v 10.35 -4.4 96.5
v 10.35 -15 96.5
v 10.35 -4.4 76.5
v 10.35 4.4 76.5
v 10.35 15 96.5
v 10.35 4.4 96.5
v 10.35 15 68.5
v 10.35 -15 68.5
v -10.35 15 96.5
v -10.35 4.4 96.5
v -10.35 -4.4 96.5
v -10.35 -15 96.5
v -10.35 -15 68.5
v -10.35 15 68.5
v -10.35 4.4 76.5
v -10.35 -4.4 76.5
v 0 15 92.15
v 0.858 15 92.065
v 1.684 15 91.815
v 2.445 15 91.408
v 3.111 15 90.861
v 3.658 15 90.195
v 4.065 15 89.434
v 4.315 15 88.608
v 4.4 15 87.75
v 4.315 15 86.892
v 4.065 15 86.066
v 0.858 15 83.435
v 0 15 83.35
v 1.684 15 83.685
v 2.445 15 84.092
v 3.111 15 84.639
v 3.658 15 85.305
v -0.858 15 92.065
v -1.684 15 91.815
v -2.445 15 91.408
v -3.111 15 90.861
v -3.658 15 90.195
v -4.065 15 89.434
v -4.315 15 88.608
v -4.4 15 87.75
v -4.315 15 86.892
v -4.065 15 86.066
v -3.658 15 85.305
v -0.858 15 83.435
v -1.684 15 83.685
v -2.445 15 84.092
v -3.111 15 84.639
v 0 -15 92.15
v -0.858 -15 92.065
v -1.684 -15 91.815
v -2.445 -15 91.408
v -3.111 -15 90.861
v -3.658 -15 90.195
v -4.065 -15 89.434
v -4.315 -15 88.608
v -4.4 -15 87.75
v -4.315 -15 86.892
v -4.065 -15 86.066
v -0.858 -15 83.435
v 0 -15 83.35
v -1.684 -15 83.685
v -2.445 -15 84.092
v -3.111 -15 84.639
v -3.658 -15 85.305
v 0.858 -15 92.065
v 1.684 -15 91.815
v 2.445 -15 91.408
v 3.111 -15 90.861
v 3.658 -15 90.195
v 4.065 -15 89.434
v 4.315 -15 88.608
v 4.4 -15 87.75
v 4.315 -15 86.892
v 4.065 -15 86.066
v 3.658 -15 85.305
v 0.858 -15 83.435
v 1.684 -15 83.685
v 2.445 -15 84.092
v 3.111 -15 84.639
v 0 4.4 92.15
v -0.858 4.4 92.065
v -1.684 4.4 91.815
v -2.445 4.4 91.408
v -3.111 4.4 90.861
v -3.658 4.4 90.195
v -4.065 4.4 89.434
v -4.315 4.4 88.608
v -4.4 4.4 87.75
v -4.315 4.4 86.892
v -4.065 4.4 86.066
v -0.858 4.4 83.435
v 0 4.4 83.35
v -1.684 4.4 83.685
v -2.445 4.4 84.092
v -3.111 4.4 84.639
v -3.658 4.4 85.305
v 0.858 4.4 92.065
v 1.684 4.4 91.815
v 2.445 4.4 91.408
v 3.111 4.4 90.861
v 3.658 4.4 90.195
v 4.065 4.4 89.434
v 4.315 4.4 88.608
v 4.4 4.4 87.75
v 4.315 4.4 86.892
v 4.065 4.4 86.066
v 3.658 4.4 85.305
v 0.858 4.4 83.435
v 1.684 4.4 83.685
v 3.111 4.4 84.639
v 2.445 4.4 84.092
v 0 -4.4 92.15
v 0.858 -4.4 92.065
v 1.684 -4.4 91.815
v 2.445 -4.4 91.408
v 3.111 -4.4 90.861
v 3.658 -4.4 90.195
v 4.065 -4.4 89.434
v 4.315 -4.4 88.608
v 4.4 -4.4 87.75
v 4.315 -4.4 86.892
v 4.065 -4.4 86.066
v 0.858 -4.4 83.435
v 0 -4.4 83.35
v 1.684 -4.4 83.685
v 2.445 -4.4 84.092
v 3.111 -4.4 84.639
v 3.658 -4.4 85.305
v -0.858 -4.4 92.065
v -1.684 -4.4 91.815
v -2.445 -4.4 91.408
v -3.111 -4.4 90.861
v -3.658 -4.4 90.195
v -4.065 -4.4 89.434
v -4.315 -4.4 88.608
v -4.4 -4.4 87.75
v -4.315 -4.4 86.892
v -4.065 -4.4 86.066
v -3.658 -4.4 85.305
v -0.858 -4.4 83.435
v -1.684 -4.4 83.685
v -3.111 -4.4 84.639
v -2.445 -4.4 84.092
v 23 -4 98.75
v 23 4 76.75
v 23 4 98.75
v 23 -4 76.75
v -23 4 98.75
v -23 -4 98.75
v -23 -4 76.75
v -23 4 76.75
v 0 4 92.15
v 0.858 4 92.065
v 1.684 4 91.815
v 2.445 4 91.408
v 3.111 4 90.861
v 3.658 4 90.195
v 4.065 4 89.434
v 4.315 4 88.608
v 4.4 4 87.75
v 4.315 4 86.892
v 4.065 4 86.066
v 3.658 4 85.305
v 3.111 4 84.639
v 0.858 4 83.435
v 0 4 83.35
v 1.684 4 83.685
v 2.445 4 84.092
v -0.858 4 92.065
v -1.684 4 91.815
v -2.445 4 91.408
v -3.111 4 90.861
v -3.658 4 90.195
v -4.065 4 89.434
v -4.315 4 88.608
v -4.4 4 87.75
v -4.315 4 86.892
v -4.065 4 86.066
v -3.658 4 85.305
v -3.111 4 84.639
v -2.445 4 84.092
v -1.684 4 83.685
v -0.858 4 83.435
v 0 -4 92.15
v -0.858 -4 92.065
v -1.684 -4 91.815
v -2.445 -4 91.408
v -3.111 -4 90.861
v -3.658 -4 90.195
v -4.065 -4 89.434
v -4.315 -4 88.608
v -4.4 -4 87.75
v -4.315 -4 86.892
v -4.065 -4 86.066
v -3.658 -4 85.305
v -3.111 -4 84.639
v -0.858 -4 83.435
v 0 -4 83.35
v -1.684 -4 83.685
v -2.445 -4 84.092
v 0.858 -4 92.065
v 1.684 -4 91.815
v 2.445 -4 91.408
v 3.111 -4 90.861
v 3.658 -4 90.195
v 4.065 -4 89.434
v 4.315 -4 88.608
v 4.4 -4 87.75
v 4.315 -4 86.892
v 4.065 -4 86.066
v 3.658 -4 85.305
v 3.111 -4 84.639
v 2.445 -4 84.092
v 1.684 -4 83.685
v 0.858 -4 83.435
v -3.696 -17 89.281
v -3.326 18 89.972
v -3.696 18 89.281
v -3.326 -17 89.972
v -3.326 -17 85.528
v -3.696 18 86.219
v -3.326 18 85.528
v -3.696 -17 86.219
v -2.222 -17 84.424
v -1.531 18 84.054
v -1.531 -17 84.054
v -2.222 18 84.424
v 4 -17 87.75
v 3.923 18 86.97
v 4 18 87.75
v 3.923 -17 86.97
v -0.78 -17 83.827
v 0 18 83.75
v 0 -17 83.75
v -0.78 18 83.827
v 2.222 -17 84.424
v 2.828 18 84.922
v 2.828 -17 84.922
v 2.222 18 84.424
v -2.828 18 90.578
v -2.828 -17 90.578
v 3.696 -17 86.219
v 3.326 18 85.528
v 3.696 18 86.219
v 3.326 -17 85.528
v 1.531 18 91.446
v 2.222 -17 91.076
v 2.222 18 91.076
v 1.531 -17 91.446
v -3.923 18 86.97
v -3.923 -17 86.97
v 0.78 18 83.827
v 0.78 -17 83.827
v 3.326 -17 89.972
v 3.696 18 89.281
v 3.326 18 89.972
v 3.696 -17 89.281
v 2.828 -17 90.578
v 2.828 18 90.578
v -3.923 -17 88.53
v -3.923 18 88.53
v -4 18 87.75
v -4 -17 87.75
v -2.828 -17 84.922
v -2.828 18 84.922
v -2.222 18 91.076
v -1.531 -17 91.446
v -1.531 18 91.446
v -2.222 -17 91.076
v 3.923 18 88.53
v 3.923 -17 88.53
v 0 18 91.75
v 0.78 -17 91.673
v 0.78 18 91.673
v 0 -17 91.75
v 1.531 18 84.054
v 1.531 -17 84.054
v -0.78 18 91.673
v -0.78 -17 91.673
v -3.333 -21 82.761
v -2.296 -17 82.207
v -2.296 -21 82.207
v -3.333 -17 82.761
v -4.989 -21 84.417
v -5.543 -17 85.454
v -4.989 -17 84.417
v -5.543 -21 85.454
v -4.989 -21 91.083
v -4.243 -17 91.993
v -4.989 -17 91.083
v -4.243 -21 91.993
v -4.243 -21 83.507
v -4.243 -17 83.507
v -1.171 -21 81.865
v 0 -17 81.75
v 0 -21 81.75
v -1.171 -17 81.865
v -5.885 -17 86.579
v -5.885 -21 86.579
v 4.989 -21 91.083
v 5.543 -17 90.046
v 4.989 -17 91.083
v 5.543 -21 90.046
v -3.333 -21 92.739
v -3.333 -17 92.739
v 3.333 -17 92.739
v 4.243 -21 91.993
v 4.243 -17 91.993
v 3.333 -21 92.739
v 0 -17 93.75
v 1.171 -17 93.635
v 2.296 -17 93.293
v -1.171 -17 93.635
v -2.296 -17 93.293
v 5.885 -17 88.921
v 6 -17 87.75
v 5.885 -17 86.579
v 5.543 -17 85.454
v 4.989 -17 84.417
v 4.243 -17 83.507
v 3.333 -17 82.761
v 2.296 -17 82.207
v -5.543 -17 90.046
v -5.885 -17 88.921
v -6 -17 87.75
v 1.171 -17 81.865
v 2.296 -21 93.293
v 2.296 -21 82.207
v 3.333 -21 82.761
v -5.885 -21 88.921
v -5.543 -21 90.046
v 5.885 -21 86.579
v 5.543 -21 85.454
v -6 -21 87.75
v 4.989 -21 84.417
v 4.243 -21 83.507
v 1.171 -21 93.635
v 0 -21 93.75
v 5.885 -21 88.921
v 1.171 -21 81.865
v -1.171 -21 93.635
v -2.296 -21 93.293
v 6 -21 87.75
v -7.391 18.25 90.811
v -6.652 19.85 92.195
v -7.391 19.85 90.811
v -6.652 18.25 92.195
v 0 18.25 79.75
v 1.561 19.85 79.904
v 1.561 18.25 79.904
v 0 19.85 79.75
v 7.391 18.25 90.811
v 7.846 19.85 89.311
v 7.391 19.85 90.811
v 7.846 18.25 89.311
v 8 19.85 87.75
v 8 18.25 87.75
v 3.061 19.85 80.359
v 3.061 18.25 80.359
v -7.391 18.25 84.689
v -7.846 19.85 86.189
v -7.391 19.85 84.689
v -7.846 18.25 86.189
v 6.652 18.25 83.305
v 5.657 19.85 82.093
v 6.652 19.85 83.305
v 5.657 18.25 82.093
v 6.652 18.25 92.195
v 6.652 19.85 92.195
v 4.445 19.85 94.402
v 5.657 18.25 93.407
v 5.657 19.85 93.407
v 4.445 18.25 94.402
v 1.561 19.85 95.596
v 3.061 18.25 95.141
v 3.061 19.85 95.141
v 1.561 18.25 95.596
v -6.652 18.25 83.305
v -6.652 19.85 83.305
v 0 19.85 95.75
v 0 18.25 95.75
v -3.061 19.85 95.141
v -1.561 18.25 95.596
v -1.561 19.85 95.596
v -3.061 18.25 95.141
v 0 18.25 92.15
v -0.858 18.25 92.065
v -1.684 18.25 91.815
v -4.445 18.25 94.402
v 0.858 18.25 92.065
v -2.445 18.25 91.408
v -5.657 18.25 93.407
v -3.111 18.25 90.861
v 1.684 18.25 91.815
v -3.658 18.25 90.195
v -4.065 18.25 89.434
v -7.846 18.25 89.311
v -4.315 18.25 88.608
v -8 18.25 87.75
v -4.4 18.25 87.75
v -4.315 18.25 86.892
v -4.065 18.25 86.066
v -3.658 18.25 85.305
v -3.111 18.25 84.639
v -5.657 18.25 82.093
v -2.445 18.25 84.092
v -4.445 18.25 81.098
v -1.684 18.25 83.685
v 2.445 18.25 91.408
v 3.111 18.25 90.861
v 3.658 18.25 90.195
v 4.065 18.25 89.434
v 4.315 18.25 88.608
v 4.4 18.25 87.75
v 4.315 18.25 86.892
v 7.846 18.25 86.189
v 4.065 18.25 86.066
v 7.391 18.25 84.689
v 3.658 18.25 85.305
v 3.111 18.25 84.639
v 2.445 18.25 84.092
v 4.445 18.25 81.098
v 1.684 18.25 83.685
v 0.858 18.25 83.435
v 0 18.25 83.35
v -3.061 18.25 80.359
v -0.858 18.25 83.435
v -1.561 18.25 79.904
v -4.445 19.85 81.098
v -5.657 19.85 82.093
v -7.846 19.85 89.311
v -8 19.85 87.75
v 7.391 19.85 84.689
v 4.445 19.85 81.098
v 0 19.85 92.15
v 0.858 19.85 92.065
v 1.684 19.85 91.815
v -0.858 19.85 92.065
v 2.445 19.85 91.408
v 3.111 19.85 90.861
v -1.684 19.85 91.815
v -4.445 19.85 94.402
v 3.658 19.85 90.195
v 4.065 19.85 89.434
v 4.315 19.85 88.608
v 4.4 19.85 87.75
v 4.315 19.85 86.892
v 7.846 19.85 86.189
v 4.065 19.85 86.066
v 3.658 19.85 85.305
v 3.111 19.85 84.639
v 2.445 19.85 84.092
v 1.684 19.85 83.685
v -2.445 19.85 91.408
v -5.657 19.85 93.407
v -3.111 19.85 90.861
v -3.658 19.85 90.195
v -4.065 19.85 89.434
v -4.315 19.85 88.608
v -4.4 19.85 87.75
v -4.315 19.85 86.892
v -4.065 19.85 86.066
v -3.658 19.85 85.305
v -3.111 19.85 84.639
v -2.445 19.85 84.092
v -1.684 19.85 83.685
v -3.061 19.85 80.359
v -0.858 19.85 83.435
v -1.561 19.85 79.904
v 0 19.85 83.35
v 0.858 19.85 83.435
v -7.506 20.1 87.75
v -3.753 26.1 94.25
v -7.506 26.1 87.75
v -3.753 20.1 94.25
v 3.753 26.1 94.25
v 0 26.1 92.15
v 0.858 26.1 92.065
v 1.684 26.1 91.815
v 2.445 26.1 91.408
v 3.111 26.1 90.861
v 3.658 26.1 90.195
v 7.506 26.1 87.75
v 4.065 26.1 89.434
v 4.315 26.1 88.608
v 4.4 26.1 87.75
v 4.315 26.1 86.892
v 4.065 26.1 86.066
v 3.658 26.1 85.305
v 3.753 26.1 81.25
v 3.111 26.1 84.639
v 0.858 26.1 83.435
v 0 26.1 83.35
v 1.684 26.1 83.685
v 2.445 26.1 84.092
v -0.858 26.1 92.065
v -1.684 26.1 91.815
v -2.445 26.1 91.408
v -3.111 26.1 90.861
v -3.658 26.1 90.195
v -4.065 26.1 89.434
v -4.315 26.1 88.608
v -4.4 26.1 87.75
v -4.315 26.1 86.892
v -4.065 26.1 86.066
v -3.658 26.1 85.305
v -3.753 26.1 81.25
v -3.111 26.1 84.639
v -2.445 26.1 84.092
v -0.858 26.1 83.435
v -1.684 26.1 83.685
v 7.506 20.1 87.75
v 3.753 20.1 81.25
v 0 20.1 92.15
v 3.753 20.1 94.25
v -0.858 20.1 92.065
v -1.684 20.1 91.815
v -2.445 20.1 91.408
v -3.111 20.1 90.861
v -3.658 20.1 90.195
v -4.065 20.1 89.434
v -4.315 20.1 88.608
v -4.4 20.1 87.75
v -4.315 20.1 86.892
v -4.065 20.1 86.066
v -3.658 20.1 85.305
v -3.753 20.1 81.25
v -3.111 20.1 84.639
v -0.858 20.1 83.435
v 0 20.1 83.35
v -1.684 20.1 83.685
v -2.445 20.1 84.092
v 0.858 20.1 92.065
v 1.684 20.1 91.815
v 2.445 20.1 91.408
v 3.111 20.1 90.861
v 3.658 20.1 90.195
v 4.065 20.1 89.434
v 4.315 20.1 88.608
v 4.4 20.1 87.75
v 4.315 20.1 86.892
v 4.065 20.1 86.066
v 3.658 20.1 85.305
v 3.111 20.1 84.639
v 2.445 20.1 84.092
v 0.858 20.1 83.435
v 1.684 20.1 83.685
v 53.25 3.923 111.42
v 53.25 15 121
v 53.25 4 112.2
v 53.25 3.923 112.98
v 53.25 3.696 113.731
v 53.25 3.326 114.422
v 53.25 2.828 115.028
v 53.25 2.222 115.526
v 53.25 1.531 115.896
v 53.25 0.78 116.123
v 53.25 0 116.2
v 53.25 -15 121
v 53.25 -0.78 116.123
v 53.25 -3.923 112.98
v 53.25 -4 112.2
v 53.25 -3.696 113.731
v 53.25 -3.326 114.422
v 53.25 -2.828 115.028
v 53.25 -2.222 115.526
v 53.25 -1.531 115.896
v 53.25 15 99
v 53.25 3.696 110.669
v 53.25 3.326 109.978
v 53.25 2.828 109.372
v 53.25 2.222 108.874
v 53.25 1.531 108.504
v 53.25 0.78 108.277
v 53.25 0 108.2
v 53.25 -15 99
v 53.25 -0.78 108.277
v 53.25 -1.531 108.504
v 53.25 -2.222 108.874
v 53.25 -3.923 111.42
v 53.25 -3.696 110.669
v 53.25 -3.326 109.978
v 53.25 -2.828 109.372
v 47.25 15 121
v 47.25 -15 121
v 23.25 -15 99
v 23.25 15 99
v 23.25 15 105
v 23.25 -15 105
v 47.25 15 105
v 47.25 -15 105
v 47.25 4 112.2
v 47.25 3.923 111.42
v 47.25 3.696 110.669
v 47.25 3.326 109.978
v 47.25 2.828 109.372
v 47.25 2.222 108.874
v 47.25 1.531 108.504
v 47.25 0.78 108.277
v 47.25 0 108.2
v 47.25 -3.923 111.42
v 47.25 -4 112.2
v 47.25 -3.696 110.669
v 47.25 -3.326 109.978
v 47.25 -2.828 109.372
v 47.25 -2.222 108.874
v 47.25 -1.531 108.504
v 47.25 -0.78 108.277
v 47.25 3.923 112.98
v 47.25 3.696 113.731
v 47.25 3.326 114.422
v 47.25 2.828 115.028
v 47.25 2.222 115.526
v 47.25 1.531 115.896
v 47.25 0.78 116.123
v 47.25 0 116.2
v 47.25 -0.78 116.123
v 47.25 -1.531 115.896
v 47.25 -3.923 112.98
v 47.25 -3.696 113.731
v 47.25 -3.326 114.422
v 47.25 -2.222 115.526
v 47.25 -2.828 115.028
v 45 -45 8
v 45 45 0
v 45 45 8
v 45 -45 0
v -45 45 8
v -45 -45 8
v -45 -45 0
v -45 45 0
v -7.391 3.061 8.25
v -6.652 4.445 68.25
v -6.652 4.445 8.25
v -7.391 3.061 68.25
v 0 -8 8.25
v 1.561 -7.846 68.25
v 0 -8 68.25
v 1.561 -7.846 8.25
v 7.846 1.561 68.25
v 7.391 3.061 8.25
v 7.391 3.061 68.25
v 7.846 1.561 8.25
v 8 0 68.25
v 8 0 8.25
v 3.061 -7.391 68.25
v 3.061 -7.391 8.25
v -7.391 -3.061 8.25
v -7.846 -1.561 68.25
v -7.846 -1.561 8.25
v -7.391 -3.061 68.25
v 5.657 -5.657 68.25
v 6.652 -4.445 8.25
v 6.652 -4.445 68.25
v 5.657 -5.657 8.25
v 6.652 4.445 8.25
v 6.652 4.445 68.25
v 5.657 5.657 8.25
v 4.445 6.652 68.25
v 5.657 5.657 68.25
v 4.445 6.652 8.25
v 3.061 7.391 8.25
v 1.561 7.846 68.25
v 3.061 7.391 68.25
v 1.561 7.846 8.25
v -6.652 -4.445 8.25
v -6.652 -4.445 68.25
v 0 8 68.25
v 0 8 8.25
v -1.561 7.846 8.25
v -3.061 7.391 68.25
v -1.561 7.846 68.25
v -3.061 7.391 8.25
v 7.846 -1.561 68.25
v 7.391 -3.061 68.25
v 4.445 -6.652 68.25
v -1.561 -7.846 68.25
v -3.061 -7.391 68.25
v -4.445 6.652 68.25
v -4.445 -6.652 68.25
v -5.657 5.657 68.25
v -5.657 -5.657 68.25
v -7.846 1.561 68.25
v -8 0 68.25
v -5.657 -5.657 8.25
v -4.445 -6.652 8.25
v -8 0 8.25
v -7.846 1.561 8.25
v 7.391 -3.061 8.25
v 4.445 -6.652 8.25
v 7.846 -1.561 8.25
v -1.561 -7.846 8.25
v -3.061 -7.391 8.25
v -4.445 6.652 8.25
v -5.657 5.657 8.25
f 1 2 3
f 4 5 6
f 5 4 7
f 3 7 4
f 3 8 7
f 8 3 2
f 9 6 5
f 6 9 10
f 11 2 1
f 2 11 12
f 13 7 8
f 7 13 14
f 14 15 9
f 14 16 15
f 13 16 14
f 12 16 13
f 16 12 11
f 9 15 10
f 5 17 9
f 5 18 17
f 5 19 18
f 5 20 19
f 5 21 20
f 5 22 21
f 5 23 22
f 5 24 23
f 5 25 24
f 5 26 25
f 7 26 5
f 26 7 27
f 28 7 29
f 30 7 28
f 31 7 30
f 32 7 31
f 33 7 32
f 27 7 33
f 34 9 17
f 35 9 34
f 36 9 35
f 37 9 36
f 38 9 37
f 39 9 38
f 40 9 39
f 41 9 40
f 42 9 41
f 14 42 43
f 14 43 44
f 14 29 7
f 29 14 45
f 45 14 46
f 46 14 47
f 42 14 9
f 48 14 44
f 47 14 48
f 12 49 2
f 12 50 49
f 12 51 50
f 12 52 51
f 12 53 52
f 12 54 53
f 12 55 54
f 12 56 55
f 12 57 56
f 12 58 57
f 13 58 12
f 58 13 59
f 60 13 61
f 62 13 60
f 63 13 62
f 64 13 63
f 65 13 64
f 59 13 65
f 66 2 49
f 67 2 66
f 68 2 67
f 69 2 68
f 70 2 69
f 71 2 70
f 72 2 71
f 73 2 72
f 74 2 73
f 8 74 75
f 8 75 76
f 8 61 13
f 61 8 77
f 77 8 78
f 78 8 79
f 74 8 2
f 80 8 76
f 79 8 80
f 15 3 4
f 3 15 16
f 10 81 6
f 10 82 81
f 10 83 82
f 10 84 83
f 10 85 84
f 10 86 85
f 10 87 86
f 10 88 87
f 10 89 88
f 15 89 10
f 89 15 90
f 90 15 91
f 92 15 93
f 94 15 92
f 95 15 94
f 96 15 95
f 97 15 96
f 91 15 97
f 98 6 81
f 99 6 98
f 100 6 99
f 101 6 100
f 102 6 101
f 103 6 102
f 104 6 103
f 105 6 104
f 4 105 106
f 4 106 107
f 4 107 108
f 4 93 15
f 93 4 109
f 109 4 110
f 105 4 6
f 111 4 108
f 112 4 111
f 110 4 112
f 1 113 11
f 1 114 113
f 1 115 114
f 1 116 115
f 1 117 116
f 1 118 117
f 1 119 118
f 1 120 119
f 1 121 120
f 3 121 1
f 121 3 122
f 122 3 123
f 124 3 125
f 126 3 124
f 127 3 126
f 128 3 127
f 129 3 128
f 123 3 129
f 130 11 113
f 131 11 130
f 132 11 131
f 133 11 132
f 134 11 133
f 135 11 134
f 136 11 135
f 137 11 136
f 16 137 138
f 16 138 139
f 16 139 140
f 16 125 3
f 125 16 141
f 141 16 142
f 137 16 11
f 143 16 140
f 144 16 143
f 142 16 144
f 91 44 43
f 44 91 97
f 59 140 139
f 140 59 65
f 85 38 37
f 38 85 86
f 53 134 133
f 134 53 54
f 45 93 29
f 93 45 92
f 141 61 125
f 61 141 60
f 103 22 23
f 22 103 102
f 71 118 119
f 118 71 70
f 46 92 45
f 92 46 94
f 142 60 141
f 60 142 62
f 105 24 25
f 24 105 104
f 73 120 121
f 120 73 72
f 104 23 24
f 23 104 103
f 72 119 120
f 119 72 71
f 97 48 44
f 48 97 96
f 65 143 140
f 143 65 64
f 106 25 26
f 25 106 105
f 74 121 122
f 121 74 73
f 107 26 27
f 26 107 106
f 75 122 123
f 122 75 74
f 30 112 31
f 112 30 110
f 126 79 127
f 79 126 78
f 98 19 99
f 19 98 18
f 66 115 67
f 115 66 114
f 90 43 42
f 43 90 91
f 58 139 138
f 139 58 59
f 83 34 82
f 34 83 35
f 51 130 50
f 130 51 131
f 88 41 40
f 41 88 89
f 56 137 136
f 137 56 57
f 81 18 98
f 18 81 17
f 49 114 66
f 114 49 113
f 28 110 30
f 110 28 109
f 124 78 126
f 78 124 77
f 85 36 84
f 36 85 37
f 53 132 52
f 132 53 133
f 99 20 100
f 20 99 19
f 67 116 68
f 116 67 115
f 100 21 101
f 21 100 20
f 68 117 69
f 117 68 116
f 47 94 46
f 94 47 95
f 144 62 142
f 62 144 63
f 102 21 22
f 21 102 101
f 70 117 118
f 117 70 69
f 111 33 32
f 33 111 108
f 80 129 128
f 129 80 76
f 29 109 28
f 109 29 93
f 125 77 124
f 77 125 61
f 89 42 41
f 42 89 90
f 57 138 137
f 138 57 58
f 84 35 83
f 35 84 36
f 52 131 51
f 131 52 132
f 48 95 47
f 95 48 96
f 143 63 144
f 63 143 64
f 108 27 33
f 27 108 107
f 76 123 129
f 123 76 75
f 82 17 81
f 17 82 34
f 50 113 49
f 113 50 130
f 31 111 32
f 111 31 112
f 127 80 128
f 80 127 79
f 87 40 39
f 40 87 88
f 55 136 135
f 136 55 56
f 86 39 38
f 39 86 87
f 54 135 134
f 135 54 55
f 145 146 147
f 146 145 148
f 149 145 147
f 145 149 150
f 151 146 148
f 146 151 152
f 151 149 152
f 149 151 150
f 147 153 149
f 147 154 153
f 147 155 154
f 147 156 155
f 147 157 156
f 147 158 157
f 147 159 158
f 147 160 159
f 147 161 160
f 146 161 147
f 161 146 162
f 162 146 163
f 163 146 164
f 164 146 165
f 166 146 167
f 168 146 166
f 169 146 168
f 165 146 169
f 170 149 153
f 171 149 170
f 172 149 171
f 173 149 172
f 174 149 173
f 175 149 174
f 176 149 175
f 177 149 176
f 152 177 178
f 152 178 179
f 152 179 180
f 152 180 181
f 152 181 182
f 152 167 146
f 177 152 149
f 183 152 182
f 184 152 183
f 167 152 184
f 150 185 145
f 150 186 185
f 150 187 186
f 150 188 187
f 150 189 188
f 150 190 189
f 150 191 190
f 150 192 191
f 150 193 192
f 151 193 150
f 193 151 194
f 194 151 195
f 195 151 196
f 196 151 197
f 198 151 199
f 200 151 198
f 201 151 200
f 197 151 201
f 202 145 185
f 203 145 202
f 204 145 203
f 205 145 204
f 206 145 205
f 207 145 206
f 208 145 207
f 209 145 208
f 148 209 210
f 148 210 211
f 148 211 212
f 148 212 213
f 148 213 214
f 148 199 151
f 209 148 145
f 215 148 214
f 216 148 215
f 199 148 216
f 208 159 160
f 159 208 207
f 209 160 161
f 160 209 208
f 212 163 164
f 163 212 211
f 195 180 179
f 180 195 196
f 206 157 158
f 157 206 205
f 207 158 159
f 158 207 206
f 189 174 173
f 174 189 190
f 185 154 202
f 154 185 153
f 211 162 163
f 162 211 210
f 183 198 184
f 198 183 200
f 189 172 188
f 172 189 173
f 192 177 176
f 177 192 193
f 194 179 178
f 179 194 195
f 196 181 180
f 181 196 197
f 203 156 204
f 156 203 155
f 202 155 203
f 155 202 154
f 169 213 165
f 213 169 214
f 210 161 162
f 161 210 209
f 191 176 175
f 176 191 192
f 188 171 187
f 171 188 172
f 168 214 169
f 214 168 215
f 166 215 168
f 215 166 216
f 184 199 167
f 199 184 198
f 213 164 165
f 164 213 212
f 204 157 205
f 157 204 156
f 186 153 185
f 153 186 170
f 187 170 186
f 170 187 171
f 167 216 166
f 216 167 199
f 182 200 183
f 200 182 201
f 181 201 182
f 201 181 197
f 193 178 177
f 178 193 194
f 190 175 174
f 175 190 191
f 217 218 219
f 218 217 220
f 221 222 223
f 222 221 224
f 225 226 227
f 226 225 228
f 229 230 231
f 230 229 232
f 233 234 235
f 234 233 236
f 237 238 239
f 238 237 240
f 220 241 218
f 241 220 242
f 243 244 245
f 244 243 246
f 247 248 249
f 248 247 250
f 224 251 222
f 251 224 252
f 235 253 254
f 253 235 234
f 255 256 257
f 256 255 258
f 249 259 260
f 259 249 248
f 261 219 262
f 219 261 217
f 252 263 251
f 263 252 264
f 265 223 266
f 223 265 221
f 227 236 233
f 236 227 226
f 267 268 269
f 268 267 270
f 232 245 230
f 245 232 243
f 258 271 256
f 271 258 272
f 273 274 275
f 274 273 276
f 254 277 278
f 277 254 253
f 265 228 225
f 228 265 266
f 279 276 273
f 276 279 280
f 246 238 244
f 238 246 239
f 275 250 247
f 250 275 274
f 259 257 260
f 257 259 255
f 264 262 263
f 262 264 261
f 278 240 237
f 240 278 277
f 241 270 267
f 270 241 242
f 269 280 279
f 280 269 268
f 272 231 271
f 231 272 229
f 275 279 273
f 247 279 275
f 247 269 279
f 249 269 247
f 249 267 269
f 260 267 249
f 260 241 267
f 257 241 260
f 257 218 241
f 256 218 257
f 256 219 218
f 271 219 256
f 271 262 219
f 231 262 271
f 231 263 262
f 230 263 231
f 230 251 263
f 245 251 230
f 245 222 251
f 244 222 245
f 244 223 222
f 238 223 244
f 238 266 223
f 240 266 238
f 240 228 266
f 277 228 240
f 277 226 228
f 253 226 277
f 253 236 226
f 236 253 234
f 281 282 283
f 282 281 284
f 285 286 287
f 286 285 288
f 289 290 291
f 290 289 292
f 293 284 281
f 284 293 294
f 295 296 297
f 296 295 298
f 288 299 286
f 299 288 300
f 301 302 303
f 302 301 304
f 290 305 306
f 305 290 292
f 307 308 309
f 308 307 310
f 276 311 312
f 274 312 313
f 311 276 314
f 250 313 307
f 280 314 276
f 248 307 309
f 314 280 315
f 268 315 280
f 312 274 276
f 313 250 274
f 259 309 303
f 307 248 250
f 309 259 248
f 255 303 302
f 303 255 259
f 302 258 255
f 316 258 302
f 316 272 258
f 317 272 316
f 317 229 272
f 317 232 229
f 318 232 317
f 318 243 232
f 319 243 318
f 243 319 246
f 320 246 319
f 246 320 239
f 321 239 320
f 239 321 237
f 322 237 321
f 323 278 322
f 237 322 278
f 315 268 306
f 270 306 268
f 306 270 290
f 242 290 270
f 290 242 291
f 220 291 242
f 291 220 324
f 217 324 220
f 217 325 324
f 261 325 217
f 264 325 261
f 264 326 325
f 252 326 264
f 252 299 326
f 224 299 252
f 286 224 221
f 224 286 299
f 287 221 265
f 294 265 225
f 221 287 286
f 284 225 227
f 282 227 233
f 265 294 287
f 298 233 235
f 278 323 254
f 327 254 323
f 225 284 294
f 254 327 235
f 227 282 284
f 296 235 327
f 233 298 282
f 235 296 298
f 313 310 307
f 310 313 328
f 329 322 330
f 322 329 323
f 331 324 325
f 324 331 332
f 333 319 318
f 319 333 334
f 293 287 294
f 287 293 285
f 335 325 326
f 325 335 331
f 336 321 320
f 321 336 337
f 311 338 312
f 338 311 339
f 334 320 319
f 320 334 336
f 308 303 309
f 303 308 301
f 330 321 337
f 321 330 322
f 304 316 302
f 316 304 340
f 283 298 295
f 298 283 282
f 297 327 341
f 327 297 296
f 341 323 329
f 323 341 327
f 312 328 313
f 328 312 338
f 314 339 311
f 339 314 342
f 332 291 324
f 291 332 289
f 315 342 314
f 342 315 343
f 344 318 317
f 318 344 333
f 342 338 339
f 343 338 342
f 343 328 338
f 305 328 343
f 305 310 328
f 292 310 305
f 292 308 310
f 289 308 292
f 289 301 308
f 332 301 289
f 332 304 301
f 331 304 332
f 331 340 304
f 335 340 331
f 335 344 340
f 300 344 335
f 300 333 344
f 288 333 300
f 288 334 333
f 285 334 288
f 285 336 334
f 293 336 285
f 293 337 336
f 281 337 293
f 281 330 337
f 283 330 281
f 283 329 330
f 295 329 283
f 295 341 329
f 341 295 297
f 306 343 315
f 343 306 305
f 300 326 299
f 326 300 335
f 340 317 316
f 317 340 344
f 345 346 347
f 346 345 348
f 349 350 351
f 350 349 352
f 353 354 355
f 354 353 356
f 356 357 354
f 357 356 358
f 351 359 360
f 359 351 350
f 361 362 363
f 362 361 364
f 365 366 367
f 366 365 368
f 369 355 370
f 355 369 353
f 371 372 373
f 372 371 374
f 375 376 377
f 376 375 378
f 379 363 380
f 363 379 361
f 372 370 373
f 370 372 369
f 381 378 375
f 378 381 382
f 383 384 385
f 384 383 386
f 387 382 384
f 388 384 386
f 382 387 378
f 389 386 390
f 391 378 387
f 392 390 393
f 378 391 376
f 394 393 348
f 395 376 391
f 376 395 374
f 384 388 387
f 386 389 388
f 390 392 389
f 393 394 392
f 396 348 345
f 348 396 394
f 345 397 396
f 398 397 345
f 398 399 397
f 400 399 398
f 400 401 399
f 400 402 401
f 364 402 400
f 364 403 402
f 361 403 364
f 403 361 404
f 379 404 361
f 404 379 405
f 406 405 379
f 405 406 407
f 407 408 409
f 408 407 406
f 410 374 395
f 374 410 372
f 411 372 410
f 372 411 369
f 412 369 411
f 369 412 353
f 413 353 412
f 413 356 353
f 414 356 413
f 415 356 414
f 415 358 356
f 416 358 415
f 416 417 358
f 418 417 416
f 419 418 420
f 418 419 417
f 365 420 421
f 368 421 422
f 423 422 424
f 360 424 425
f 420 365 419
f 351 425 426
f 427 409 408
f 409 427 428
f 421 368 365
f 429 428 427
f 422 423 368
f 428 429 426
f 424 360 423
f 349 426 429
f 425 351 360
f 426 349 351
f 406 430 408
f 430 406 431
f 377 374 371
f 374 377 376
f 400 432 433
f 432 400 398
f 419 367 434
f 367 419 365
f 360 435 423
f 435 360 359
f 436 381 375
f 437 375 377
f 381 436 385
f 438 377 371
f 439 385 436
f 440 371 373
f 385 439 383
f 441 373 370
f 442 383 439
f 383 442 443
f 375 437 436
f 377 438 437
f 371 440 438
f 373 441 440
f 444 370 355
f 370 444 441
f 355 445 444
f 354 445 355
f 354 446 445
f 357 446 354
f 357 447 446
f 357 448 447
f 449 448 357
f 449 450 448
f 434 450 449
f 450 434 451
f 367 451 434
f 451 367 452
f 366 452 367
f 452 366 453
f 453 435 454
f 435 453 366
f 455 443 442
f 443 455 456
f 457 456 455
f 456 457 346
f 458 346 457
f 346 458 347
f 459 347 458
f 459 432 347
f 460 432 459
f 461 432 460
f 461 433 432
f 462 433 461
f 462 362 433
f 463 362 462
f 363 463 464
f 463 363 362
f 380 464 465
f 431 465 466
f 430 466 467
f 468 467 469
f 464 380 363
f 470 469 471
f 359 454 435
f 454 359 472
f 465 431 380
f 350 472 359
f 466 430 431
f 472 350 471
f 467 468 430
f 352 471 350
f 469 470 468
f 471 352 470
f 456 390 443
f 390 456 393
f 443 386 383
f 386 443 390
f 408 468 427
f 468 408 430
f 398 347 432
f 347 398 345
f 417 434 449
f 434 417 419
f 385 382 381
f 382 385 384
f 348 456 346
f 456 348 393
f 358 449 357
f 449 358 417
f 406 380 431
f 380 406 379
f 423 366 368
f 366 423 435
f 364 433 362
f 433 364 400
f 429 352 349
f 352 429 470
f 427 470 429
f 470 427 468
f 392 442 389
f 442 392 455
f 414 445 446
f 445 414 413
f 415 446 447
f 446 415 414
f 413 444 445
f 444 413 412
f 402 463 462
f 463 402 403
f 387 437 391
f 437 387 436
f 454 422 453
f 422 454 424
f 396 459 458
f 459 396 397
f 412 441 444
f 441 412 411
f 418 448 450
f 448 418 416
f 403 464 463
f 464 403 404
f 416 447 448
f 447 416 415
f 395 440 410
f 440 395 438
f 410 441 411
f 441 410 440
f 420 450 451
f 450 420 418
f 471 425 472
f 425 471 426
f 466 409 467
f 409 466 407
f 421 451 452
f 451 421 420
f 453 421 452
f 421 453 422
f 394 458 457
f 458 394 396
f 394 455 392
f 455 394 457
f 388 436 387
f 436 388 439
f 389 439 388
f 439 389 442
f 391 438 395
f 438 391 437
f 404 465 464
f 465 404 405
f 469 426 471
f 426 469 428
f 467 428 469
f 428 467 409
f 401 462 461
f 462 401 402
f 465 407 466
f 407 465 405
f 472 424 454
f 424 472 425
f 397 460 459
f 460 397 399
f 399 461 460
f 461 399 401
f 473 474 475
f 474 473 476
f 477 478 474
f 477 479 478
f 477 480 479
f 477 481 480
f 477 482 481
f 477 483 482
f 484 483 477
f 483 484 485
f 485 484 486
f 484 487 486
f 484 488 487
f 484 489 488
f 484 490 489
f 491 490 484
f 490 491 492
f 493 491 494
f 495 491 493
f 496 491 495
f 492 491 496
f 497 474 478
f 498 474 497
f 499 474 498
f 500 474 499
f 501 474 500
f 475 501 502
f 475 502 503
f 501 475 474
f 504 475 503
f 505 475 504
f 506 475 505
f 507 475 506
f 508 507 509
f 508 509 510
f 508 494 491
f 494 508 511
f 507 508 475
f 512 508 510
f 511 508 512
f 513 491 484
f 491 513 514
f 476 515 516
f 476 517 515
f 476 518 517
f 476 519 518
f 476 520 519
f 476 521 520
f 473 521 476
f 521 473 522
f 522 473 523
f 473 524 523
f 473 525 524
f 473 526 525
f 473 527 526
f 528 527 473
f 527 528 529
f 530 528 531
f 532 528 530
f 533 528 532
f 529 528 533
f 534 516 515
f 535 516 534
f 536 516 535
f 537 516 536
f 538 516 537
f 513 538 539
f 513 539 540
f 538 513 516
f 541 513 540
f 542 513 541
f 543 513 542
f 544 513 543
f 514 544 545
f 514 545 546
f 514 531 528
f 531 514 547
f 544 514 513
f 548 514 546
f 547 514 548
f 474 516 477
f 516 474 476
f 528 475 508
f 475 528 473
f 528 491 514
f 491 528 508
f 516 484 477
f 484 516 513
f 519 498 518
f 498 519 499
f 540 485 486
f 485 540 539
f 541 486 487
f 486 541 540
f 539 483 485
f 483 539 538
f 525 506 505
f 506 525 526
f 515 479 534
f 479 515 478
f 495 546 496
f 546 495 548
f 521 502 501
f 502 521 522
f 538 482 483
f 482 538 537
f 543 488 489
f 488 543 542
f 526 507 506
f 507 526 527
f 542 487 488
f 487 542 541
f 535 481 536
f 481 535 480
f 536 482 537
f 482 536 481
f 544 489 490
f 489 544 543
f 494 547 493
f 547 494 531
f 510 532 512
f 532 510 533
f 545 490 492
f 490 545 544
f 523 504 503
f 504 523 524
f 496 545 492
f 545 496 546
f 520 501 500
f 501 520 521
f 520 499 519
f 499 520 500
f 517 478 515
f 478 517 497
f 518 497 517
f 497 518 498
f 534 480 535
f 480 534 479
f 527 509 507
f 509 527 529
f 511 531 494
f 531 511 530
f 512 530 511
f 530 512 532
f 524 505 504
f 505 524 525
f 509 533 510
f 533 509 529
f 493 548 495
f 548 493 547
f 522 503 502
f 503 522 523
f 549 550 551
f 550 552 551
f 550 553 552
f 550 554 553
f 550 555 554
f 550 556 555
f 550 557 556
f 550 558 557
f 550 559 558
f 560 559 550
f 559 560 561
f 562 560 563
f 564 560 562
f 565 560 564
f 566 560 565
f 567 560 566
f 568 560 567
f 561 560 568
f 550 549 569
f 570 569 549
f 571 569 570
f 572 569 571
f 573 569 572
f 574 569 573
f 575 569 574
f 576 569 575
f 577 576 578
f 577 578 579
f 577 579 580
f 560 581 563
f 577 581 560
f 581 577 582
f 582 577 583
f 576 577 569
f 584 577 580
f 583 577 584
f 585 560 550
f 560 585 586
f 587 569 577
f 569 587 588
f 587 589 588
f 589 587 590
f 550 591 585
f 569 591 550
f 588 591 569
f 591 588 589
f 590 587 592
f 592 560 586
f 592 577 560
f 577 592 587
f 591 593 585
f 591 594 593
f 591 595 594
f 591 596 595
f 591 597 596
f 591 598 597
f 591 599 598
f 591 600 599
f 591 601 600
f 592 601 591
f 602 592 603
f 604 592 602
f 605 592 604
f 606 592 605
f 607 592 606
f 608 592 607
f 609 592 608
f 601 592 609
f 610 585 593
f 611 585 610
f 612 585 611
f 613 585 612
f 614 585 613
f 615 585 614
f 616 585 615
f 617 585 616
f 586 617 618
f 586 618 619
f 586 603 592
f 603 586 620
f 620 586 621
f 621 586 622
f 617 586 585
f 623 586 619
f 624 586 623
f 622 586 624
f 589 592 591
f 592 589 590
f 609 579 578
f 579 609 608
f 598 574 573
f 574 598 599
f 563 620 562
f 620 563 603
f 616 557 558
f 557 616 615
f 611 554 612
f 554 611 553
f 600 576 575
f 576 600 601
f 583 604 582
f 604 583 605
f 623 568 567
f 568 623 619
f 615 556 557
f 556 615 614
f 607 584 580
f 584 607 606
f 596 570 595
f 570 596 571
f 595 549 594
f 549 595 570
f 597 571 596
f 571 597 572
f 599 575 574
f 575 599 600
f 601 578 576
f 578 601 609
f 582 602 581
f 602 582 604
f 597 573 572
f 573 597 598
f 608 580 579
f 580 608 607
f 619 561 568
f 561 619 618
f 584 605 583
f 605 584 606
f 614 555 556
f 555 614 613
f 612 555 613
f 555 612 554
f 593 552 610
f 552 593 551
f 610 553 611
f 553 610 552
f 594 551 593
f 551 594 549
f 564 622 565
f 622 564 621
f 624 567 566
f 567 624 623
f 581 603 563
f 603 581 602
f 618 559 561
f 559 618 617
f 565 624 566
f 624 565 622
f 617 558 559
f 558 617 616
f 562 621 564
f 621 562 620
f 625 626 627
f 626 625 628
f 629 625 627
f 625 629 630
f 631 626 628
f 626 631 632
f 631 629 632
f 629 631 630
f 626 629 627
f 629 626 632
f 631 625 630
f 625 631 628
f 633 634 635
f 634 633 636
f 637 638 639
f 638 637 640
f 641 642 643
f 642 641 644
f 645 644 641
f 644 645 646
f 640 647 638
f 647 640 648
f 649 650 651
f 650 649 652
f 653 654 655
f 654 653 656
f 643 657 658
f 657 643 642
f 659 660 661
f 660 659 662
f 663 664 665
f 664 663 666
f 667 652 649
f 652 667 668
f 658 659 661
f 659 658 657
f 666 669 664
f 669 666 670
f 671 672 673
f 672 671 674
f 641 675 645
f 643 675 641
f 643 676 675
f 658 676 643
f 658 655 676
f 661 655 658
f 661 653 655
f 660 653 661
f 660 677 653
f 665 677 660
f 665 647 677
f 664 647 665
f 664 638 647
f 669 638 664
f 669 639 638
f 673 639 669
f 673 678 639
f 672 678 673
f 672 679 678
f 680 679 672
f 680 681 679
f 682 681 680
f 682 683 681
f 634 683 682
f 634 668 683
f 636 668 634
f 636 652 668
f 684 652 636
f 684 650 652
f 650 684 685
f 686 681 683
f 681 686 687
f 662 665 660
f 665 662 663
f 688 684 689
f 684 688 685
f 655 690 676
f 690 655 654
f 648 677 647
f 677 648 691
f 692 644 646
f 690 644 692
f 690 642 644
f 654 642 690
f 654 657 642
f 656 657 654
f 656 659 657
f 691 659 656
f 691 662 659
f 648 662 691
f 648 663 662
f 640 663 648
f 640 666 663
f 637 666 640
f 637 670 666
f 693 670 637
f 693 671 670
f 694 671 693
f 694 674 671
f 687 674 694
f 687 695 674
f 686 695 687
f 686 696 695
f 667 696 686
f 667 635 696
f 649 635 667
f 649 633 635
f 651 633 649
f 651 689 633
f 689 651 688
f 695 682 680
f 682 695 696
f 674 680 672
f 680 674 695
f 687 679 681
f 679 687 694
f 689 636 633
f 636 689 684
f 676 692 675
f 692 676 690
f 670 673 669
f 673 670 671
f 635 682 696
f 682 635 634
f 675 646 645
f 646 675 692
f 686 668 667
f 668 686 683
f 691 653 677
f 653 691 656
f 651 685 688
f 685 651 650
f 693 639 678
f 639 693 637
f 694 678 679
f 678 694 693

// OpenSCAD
$fn = 32;

// ------------------------------------------------------------------------
// Lamp arm: column d16 x 60 mm, arm 46 mm
// Every part is its own module, assembly() places every instance.
// ------------------------------------------------------------------------

// --- part 1 ---
module lamp_base() {
  difference() {
    translate([-45, -45, 0]) cube([90, 90, 8]);
  }
}

// --- part 2 ---
module lamp_column() {
  cylinder(h = 60, d = 16);
}

// --- part 3 ---
module head_fork() {
  difference() {
    translate([-10.35, -15, 0]) cube([20.7, 30, 28]);
    translate([-11.35, -4.4, 8]) cube([22.7, 8.8, 21]);
    translate([0, 0, 19.25]) rotate([90, 0, 0]) cylinder(h = 32, d = 8.8, center = true);
  }
}

// --- part 4 ---
module lamp_arm() {
  difference() {
    translate([-23, -4, 0]) cube([46, 8, 22]);
    translate([0, 0, 11]) rotate([90, 0, 0]) cylinder(h = 10, d = 8.8, center = true);
  }
}

// --- part 5 ---
module arm_pin() {
  rotate([0, 90, 0]) cylinder(h = 36, d = 8, center = true);
  translate([-21, 0, 0]) rotate([0, 90, 0]) cylinder(h = 4, d = 12);
}

// --- part 6 ---
module arm_washer() {
  difference() {
      translate([0, 0, 0]) cylinder(h = 1.6, d = 16);
      translate([0, 0, -1]) cylinder(h = 3.6, d = 8.8);
    }
}

// --- part 7 ---
module arm_nut() {
  difference() {
    linear_extrude(height = 6) polygon(points = [[7.506, 0], [3.753, 6.5], [-3.753, 6.5], [-7.506, 0], [-3.753, -6.5], [3.753, -6.5]]);
    translate([0, 0, -1]) cylinder(h = 8, d = 8.8);
  }
}

// --- part 8 ---
module shade_bracket() {
  difference() {
    translate([-15, -15, 0]) cube([30, 30, 22]);
    translate([-16, -16, 6]) cube([25, 32, 17]);
    translate([12, 0, 13.2]) rotate([0, 90, 0]) cylinder(h = 8, d = 8, center = true);
  }
}

// --- assembly ---
module assembly() {
  color([0.80, 0.24, 0.20]) translate([0, 0, 0]) rotate([0, 0, 0]) lamp_base();
  color([0.20, 0.45, 0.75]) translate([0, 0, 8.25]) rotate([0, 0, 0]) lamp_column();
  color([0.25, 0.62, 0.32]) translate([0, 0, 68.5]) rotate([0, 0, 0]) head_fork();
  color([0.92, 0.70, 0.18]) translate([0, 0, 76.75]) rotate([0, 0, 0]) lamp_arm();
  color([0.58, 0.35, 0.70]) translate([0, 0, 87.75]) rotate([0, 0, 90]) arm_pin();
  color([0.16, 0.66, 0.66]) translate([0, 19.85, 87.75]) rotate([90, 0, 0]) arm_washer();
  color([0.85, 0.48, 0.18]) translate([0, 26.1, 87.75]) rotate([90, 0, 0]) arm_nut();
  color([0.55, 0.60, 0.65]) translate([38.25, 0, 99]) rotate([0, 0, 0]) shade_bracket();
}

assembly();
